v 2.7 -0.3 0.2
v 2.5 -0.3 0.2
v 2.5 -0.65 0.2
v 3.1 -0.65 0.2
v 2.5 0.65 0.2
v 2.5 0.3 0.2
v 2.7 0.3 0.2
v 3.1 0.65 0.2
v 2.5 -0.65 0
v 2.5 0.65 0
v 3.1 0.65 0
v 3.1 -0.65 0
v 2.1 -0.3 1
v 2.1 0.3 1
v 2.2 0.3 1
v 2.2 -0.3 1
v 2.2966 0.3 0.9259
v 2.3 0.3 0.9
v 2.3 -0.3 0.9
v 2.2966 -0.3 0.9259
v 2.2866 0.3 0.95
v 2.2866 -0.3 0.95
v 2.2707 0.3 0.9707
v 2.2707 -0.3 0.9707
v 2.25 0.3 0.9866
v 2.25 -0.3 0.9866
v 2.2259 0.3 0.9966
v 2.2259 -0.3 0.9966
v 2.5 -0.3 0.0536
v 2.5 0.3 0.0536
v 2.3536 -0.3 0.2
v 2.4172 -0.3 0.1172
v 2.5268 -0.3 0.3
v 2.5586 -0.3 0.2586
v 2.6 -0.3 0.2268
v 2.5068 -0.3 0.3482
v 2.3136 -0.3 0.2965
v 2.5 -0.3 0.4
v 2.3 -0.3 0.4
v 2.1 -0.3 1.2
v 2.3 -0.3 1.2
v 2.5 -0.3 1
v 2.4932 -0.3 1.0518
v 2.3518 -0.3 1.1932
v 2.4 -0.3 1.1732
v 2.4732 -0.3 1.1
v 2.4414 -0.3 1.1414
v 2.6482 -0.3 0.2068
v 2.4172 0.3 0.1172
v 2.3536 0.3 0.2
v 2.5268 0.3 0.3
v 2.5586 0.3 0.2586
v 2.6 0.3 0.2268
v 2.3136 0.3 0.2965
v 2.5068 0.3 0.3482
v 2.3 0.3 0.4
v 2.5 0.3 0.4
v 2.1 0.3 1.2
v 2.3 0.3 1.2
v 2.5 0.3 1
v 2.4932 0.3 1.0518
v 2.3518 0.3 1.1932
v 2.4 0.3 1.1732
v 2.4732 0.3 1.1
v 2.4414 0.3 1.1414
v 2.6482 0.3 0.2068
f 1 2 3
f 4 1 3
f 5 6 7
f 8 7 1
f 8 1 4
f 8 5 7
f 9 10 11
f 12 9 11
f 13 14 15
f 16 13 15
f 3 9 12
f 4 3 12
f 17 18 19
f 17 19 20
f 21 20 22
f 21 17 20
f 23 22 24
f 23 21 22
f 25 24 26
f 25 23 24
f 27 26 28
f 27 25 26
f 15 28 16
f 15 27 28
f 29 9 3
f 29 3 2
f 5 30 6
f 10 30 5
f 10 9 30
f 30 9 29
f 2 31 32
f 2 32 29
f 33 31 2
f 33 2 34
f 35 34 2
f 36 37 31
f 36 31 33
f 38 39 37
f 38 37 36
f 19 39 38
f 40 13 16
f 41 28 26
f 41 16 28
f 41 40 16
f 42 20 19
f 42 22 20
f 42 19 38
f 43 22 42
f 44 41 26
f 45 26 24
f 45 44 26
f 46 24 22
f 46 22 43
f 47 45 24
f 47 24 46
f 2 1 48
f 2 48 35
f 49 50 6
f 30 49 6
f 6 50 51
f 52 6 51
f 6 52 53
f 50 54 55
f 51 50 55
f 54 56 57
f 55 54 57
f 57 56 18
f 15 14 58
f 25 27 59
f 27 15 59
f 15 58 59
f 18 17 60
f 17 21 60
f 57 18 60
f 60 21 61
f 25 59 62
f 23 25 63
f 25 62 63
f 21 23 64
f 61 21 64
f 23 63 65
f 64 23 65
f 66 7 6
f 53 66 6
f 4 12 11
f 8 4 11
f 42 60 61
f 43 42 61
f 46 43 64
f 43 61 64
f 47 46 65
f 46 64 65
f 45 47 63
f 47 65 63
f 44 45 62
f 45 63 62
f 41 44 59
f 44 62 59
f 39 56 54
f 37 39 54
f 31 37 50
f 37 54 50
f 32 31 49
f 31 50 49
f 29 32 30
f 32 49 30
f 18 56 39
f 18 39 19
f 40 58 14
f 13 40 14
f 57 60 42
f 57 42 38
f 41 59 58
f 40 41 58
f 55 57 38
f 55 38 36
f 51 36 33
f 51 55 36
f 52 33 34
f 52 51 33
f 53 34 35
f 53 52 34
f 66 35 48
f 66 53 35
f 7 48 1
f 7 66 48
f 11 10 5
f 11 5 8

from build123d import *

# Parameters (mm, degrees)
BOX036_W     = 0.6
BOX036_H     = 1.3
BOX036_DEPTH = 0.2
PAD001_DEPTH = 0.6


with BuildPart() as kub036:
    # Box036 → Box036 (new body)
    with BuildSketch(Plane(origin=(2.5, -0.65, 0), x_dir=(1, 0, 0), z_dir=(0, 0, 1))):
        with Locations((0.3, 0.65)):
            Rectangle(BOX036_W, BOX036_H)
    extrude(amount=BOX036_DEPTH)


with BuildPart() as fusion004:
    # Sketch001 → Pad001 (new body)
    with BuildSketch(Plane.XZ):
        with BuildLine():
            ThreePointArc((3.7, 1), (3.641421, 1.141421), (3.5, 1.2))
            Line((3.5, 1.2), (3.3, 1.2))
            Line((3.3, 1.2), (3.3, 1))
            Line((3.3, 1), (3.4, 1))
            ThreePointArc((3.5, 0.9), (3.470711, 0.970711), (3.4, 1))
            Line((3.5, 0.4), (3.5, 0.9))
            ThreePointArc((3.5, 0.4), (3.617157, 0.117157), (3.9, 0))
            Line((4, 0), (3.9, 0))
            Line((4, 0.2), (4, 0))
            Line((3.9, 0.2), (4, 0.2))
            ThreePointArc((3.7, 0.4), (3.758579, 0.258579), (3.9, 0.2))
            Line((3.7, 1), (3.7, 0.4))
        make_face()
    extrude(amount=PAD001_DEPTH)


with BuildPart() as fusion004_1:
    # Body001 placement: moved
    add(fusion004.part.moved(Location((-1.2, 0.3, 0))))

    # Fusion004: union Kub036
    add(kub036.part)


solid = fusion004_1.part
